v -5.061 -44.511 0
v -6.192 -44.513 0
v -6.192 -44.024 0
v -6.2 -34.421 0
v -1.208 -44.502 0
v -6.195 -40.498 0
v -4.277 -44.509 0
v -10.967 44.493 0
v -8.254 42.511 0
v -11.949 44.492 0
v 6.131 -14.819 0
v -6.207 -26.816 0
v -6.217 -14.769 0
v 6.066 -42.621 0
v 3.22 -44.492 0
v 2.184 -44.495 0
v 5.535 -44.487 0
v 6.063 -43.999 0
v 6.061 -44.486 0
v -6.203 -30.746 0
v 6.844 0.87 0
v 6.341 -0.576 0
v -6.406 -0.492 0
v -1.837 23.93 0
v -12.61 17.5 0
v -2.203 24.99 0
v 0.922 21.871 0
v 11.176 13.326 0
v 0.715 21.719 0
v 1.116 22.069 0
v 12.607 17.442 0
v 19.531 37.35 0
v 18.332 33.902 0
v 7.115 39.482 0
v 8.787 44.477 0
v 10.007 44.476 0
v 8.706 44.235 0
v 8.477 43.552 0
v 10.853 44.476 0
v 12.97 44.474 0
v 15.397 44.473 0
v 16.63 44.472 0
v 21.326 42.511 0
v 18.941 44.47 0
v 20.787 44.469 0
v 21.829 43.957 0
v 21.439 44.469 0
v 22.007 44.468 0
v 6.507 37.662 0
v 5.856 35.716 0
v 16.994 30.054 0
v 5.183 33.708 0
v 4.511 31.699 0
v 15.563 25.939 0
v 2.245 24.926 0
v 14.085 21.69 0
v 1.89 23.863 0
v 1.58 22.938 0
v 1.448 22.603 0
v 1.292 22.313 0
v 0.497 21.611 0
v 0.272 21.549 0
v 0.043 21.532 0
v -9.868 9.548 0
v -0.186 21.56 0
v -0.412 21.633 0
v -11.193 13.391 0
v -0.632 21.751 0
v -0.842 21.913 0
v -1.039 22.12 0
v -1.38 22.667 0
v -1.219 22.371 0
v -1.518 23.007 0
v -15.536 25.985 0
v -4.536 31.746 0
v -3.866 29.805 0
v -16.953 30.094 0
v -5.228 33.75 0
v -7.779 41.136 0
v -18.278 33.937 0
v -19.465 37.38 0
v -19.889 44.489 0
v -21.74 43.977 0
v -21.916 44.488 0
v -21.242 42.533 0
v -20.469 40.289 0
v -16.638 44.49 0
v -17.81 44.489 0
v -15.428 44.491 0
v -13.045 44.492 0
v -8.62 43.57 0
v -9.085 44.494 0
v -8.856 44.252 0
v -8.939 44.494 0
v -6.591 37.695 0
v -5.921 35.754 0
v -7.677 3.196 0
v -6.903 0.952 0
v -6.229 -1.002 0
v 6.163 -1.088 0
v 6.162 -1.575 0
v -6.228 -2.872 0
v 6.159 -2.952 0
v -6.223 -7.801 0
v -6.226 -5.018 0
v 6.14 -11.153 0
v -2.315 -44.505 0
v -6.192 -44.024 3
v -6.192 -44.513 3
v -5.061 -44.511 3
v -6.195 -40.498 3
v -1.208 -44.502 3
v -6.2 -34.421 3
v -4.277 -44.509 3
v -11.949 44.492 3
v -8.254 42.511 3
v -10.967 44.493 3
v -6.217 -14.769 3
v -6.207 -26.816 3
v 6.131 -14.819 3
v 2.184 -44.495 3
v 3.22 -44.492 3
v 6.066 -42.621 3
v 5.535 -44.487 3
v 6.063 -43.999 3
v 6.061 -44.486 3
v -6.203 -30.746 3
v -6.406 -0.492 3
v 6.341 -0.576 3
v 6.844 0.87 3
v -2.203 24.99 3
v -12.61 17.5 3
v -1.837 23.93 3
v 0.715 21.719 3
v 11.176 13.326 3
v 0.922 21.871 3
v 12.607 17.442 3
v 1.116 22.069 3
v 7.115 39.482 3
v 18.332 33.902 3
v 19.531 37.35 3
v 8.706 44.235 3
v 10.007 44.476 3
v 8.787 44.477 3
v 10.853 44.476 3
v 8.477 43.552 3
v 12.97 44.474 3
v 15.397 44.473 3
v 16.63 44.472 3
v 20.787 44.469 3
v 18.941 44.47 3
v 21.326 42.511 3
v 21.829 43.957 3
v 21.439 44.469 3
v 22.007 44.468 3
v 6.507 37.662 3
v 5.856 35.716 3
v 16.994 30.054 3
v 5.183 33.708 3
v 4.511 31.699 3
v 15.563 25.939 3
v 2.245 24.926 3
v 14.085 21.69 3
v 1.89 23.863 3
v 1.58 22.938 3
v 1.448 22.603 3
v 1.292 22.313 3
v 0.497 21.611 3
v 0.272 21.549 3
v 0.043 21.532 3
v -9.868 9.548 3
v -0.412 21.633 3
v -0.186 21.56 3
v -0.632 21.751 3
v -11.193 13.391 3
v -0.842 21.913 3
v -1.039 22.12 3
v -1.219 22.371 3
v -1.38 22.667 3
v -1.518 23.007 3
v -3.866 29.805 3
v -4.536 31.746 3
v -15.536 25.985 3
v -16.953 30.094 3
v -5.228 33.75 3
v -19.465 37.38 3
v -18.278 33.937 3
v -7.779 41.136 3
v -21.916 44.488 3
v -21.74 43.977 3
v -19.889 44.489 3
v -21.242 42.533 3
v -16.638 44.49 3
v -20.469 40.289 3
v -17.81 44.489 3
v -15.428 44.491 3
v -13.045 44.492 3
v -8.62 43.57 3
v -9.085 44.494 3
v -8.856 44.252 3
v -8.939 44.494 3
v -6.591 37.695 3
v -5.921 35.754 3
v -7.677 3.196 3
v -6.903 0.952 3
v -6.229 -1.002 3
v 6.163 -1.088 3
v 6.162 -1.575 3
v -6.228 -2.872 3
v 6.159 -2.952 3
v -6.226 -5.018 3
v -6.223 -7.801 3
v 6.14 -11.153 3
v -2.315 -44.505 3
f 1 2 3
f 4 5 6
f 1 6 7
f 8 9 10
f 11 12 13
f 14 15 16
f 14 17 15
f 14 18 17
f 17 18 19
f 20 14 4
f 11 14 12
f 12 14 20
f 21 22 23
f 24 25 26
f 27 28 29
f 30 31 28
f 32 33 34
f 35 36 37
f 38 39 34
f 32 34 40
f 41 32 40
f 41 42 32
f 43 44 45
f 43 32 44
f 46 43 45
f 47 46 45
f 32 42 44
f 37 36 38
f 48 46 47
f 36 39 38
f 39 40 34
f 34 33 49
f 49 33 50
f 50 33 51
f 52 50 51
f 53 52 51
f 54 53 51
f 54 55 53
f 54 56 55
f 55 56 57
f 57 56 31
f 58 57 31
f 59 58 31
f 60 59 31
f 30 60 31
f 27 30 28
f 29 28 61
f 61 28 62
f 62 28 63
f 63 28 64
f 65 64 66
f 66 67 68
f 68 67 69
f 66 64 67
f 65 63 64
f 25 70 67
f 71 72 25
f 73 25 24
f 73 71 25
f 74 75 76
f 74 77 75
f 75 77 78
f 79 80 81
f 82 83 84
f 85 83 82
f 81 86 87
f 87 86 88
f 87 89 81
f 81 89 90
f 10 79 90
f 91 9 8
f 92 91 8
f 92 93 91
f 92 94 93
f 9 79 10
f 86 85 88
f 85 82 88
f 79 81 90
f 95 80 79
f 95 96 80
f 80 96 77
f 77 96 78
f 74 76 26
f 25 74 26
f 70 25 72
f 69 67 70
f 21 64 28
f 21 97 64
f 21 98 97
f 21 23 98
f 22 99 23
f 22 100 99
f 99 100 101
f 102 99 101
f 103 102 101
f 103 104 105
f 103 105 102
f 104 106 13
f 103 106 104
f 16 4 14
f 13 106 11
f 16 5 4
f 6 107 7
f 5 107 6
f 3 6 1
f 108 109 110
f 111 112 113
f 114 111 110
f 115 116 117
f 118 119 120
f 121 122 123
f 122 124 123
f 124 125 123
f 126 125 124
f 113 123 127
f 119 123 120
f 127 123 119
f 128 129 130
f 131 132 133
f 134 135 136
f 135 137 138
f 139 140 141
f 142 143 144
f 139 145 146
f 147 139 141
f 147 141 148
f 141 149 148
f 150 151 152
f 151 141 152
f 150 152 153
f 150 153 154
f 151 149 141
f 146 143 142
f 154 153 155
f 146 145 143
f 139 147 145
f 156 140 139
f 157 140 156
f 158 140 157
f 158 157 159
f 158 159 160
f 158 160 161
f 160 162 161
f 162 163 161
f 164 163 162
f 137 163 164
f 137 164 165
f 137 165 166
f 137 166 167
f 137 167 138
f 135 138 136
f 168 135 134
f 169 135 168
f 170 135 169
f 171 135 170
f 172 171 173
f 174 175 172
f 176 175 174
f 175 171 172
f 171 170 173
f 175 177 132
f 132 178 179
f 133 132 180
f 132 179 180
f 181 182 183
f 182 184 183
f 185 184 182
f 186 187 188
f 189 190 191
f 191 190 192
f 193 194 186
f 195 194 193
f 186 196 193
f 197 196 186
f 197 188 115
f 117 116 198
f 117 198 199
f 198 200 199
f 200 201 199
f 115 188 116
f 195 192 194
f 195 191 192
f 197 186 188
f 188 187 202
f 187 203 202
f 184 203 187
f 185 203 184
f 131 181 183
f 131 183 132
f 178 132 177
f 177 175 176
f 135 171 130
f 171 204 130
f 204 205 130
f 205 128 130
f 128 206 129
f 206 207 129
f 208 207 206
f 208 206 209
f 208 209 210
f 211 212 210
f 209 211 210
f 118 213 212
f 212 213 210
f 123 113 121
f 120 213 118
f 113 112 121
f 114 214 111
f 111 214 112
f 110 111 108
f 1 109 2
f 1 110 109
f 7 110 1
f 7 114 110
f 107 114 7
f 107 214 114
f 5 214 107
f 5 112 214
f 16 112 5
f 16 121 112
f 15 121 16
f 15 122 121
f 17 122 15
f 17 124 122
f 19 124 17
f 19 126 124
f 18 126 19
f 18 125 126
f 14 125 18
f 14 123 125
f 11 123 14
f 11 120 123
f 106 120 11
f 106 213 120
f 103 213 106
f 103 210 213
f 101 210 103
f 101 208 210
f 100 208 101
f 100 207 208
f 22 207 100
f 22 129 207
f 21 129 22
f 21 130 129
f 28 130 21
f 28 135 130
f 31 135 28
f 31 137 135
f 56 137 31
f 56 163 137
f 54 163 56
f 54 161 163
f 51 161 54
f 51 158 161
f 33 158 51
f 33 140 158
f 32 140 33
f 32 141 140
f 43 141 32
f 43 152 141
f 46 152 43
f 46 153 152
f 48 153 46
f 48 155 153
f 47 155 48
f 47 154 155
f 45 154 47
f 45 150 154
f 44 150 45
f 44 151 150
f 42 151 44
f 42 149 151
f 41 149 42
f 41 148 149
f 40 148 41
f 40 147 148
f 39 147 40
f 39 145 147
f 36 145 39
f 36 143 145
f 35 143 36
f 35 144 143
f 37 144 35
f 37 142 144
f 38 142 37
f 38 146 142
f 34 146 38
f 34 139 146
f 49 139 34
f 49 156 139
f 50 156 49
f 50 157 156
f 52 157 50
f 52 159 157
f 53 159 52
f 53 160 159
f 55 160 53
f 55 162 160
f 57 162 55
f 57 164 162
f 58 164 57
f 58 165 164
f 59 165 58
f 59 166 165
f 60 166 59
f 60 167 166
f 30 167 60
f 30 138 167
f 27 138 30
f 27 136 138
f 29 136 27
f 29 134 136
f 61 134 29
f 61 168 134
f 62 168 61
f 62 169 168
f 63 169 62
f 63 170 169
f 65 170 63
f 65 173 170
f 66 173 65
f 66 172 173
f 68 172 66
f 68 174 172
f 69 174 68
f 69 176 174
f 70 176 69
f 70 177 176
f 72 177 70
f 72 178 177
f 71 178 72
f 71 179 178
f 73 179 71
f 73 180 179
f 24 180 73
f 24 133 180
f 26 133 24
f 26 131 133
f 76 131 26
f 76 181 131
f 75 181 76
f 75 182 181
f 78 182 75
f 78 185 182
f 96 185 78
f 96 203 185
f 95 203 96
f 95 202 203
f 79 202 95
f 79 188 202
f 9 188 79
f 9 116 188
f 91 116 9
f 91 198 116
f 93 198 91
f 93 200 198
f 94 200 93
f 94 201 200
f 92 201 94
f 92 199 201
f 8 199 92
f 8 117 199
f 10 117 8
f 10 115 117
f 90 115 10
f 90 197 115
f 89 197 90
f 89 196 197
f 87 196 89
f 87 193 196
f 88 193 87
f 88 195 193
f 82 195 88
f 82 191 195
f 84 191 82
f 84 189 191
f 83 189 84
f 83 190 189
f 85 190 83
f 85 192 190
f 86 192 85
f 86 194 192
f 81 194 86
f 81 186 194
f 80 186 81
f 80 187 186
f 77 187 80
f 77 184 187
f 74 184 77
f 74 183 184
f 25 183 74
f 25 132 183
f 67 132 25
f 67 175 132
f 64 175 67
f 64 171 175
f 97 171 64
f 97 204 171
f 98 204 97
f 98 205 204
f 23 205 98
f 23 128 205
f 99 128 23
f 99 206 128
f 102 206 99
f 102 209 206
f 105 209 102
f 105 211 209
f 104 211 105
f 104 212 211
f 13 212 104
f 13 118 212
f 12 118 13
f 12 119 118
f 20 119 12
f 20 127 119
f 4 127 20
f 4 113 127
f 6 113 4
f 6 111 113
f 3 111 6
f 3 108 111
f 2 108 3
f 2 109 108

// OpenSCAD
// Generated from 交通部公路局（原交通部公路總局）「新式號牌使用之英文字、數字字體」author trace
fudge = 0.1;

module glyph_2012_Y(h = 3) {
  difference() {
    linear_extrude(height = h)
      polygon(points = [[-21.9165, 44.4876], [-21.7404, 43.9767], [-21.2425, 42.5329], [-20.4688, 40.2895], [-19.4654, 37.3798], [-18.2782, 33.9369], [-16.953, 30.0943], [-15.536, 25.985], [-14.073, 21.7426], [-12.61, 17.5001], [-11.1929, 13.3909], [-9.8678, 9.5482], [-8.6805, 6.1053], [-7.6771, 3.1956], [-6.9034, 0.9522], [-6.4056, -0.4916], [-6.2294, -1.0025], [-6.229, -1.4911], [-6.2278, -2.8721], [-6.2259, -5.0179], [-6.2235, -7.801], [-6.2206, -11.094], [-6.2174, -14.7695], [-6.214, -18.6999], [-6.2105, -22.7578], [-6.207, -26.8156], [-6.2035, -30.746], [-6.2003, -34.4215], [-6.1975, -37.7145], [-6.1951, -40.4977], [-6.1932, -42.6434], [-6.192, -44.0244], [-6.1916, -44.513], [-6.054, -44.5127], [-5.6651, -44.5119], [-5.0608, -44.5106], [-4.277, -44.5088], [-3.3497, -44.5068], [-2.3146, -44.5046], [-1.2078, -44.5021], [-0.065, -44.4996], [1.0777, -44.4971], [2.1845, -44.4947], [3.2196, -44.4924], [4.1469, -44.4904], [4.9307, -44.4887], [5.535, -44.4874], [5.9239, -44.4865], [6.0615, -44.4862], [6.0626, -43.9988], [6.0659, -42.6215], [6.0709, -40.4812], [6.0774, -37.7052], [6.0851, -34.4207], [6.0937, -30.7547], [6.1029, -26.8344], [6.1124, -22.787], [6.1219, -18.7396], [6.1311, -14.8193], [6.1398, -11.1533], [6.1475, -7.8687], [6.154, -5.0928], [6.159, -2.9525], [6.1622, -1.5751], [6.1634, -1.0877], [6.3413, -0.5761], [6.8442, 0.8698], [7.6255, 3.1164], [8.6389, 6.0304], [9.838, 9.4783], [11.1763, 13.3265], [12.6075, 17.4417], [14.085, 21.6903], [15.5626, 25.939], [16.9938, 30.0541], [18.3321, 33.9024], [19.5312, 37.3502], [20.5446, 40.2642], [21.3259, 42.5109], [21.8287, 43.9568], [22.0067, 44.4684], [21.8582, 44.4685], [21.4386, 44.4688], [20.7867, 44.4692], [19.9411, 44.4698], [18.9406, 44.4705], [17.8239, 44.4712], [16.6297, 44.472], [15.3968, 44.4729], [14.164, 44.4737], [12.9698, 44.4745], [11.8531, 44.4753], [10.8526, 44.476], [10.007, 44.4765], [9.3551, 44.477], [8.9355, 44.4773], [8.787, 44.4774], [8.7061, 44.2355], [8.4773, 43.5519], [8.1219, 42.4896], [7.6609, 41.1118], [7.1155, 39.4816], [6.5067, 37.6621], [5.8556, 35.7164], [5.1835, 33.7076], [4.5113, 31.6988], [3.8603, 29.7531], [3.2515, 27.9336], [2.7061, 26.3034], [2.2451, 24.9256], [1.8896, 23.8633], [1.6609, 23.1797], [1.58, 22.9378], [1.4479, 22.6026], [1.292, 22.3132], [1.1156, 22.0695], [0.922, 21.8714], [0.7146, 21.7187], [0.4967, 21.6114], [0.2718, 21.5493], [0.0431, 21.5323], [-0.186, 21.5603], [-0.4121, 21.6332], [-0.6318, 21.7509], [-0.8419, 21.9132], [-1.0388, 22.12], [-1.2194, 22.3713], [-1.3802, 22.6669], [-1.5179, 23.0067], [-1.6012, 23.248], [-1.8367, 23.93], [-2.2027, 24.9896], [-2.6774, 26.364], [-3.2391, 27.9903], [-3.866, 29.8053], [-4.5363, 31.7463], [-5.2284, 33.7502], [-5.9206, 35.7541], [-6.5909, 37.6951], [-7.2178, 39.5101], [-7.7795, 41.1363], [-8.2542, 42.5108], [-8.6201, 43.5704], [-8.8557, 44.2524], [-8.939, 44.4937], [-9.0848, 44.4936], [-9.4966, 44.4934], [-10.1366, 44.4931], [-10.9668, 44.4927], [-11.9489, 44.4923], [-13.0452, 44.4918], [-14.2175, 44.4912], [-15.4278, 44.4906], [-16.6381, 44.4901], [-17.8104, 44.4895], [-18.9066, 44.489], [-19.8888, 44.4886], [-20.7189, 44.4882], [-21.3589, 44.4879], [-21.7708, 44.4877]]);
  }
}

glyph_2012_Y();
